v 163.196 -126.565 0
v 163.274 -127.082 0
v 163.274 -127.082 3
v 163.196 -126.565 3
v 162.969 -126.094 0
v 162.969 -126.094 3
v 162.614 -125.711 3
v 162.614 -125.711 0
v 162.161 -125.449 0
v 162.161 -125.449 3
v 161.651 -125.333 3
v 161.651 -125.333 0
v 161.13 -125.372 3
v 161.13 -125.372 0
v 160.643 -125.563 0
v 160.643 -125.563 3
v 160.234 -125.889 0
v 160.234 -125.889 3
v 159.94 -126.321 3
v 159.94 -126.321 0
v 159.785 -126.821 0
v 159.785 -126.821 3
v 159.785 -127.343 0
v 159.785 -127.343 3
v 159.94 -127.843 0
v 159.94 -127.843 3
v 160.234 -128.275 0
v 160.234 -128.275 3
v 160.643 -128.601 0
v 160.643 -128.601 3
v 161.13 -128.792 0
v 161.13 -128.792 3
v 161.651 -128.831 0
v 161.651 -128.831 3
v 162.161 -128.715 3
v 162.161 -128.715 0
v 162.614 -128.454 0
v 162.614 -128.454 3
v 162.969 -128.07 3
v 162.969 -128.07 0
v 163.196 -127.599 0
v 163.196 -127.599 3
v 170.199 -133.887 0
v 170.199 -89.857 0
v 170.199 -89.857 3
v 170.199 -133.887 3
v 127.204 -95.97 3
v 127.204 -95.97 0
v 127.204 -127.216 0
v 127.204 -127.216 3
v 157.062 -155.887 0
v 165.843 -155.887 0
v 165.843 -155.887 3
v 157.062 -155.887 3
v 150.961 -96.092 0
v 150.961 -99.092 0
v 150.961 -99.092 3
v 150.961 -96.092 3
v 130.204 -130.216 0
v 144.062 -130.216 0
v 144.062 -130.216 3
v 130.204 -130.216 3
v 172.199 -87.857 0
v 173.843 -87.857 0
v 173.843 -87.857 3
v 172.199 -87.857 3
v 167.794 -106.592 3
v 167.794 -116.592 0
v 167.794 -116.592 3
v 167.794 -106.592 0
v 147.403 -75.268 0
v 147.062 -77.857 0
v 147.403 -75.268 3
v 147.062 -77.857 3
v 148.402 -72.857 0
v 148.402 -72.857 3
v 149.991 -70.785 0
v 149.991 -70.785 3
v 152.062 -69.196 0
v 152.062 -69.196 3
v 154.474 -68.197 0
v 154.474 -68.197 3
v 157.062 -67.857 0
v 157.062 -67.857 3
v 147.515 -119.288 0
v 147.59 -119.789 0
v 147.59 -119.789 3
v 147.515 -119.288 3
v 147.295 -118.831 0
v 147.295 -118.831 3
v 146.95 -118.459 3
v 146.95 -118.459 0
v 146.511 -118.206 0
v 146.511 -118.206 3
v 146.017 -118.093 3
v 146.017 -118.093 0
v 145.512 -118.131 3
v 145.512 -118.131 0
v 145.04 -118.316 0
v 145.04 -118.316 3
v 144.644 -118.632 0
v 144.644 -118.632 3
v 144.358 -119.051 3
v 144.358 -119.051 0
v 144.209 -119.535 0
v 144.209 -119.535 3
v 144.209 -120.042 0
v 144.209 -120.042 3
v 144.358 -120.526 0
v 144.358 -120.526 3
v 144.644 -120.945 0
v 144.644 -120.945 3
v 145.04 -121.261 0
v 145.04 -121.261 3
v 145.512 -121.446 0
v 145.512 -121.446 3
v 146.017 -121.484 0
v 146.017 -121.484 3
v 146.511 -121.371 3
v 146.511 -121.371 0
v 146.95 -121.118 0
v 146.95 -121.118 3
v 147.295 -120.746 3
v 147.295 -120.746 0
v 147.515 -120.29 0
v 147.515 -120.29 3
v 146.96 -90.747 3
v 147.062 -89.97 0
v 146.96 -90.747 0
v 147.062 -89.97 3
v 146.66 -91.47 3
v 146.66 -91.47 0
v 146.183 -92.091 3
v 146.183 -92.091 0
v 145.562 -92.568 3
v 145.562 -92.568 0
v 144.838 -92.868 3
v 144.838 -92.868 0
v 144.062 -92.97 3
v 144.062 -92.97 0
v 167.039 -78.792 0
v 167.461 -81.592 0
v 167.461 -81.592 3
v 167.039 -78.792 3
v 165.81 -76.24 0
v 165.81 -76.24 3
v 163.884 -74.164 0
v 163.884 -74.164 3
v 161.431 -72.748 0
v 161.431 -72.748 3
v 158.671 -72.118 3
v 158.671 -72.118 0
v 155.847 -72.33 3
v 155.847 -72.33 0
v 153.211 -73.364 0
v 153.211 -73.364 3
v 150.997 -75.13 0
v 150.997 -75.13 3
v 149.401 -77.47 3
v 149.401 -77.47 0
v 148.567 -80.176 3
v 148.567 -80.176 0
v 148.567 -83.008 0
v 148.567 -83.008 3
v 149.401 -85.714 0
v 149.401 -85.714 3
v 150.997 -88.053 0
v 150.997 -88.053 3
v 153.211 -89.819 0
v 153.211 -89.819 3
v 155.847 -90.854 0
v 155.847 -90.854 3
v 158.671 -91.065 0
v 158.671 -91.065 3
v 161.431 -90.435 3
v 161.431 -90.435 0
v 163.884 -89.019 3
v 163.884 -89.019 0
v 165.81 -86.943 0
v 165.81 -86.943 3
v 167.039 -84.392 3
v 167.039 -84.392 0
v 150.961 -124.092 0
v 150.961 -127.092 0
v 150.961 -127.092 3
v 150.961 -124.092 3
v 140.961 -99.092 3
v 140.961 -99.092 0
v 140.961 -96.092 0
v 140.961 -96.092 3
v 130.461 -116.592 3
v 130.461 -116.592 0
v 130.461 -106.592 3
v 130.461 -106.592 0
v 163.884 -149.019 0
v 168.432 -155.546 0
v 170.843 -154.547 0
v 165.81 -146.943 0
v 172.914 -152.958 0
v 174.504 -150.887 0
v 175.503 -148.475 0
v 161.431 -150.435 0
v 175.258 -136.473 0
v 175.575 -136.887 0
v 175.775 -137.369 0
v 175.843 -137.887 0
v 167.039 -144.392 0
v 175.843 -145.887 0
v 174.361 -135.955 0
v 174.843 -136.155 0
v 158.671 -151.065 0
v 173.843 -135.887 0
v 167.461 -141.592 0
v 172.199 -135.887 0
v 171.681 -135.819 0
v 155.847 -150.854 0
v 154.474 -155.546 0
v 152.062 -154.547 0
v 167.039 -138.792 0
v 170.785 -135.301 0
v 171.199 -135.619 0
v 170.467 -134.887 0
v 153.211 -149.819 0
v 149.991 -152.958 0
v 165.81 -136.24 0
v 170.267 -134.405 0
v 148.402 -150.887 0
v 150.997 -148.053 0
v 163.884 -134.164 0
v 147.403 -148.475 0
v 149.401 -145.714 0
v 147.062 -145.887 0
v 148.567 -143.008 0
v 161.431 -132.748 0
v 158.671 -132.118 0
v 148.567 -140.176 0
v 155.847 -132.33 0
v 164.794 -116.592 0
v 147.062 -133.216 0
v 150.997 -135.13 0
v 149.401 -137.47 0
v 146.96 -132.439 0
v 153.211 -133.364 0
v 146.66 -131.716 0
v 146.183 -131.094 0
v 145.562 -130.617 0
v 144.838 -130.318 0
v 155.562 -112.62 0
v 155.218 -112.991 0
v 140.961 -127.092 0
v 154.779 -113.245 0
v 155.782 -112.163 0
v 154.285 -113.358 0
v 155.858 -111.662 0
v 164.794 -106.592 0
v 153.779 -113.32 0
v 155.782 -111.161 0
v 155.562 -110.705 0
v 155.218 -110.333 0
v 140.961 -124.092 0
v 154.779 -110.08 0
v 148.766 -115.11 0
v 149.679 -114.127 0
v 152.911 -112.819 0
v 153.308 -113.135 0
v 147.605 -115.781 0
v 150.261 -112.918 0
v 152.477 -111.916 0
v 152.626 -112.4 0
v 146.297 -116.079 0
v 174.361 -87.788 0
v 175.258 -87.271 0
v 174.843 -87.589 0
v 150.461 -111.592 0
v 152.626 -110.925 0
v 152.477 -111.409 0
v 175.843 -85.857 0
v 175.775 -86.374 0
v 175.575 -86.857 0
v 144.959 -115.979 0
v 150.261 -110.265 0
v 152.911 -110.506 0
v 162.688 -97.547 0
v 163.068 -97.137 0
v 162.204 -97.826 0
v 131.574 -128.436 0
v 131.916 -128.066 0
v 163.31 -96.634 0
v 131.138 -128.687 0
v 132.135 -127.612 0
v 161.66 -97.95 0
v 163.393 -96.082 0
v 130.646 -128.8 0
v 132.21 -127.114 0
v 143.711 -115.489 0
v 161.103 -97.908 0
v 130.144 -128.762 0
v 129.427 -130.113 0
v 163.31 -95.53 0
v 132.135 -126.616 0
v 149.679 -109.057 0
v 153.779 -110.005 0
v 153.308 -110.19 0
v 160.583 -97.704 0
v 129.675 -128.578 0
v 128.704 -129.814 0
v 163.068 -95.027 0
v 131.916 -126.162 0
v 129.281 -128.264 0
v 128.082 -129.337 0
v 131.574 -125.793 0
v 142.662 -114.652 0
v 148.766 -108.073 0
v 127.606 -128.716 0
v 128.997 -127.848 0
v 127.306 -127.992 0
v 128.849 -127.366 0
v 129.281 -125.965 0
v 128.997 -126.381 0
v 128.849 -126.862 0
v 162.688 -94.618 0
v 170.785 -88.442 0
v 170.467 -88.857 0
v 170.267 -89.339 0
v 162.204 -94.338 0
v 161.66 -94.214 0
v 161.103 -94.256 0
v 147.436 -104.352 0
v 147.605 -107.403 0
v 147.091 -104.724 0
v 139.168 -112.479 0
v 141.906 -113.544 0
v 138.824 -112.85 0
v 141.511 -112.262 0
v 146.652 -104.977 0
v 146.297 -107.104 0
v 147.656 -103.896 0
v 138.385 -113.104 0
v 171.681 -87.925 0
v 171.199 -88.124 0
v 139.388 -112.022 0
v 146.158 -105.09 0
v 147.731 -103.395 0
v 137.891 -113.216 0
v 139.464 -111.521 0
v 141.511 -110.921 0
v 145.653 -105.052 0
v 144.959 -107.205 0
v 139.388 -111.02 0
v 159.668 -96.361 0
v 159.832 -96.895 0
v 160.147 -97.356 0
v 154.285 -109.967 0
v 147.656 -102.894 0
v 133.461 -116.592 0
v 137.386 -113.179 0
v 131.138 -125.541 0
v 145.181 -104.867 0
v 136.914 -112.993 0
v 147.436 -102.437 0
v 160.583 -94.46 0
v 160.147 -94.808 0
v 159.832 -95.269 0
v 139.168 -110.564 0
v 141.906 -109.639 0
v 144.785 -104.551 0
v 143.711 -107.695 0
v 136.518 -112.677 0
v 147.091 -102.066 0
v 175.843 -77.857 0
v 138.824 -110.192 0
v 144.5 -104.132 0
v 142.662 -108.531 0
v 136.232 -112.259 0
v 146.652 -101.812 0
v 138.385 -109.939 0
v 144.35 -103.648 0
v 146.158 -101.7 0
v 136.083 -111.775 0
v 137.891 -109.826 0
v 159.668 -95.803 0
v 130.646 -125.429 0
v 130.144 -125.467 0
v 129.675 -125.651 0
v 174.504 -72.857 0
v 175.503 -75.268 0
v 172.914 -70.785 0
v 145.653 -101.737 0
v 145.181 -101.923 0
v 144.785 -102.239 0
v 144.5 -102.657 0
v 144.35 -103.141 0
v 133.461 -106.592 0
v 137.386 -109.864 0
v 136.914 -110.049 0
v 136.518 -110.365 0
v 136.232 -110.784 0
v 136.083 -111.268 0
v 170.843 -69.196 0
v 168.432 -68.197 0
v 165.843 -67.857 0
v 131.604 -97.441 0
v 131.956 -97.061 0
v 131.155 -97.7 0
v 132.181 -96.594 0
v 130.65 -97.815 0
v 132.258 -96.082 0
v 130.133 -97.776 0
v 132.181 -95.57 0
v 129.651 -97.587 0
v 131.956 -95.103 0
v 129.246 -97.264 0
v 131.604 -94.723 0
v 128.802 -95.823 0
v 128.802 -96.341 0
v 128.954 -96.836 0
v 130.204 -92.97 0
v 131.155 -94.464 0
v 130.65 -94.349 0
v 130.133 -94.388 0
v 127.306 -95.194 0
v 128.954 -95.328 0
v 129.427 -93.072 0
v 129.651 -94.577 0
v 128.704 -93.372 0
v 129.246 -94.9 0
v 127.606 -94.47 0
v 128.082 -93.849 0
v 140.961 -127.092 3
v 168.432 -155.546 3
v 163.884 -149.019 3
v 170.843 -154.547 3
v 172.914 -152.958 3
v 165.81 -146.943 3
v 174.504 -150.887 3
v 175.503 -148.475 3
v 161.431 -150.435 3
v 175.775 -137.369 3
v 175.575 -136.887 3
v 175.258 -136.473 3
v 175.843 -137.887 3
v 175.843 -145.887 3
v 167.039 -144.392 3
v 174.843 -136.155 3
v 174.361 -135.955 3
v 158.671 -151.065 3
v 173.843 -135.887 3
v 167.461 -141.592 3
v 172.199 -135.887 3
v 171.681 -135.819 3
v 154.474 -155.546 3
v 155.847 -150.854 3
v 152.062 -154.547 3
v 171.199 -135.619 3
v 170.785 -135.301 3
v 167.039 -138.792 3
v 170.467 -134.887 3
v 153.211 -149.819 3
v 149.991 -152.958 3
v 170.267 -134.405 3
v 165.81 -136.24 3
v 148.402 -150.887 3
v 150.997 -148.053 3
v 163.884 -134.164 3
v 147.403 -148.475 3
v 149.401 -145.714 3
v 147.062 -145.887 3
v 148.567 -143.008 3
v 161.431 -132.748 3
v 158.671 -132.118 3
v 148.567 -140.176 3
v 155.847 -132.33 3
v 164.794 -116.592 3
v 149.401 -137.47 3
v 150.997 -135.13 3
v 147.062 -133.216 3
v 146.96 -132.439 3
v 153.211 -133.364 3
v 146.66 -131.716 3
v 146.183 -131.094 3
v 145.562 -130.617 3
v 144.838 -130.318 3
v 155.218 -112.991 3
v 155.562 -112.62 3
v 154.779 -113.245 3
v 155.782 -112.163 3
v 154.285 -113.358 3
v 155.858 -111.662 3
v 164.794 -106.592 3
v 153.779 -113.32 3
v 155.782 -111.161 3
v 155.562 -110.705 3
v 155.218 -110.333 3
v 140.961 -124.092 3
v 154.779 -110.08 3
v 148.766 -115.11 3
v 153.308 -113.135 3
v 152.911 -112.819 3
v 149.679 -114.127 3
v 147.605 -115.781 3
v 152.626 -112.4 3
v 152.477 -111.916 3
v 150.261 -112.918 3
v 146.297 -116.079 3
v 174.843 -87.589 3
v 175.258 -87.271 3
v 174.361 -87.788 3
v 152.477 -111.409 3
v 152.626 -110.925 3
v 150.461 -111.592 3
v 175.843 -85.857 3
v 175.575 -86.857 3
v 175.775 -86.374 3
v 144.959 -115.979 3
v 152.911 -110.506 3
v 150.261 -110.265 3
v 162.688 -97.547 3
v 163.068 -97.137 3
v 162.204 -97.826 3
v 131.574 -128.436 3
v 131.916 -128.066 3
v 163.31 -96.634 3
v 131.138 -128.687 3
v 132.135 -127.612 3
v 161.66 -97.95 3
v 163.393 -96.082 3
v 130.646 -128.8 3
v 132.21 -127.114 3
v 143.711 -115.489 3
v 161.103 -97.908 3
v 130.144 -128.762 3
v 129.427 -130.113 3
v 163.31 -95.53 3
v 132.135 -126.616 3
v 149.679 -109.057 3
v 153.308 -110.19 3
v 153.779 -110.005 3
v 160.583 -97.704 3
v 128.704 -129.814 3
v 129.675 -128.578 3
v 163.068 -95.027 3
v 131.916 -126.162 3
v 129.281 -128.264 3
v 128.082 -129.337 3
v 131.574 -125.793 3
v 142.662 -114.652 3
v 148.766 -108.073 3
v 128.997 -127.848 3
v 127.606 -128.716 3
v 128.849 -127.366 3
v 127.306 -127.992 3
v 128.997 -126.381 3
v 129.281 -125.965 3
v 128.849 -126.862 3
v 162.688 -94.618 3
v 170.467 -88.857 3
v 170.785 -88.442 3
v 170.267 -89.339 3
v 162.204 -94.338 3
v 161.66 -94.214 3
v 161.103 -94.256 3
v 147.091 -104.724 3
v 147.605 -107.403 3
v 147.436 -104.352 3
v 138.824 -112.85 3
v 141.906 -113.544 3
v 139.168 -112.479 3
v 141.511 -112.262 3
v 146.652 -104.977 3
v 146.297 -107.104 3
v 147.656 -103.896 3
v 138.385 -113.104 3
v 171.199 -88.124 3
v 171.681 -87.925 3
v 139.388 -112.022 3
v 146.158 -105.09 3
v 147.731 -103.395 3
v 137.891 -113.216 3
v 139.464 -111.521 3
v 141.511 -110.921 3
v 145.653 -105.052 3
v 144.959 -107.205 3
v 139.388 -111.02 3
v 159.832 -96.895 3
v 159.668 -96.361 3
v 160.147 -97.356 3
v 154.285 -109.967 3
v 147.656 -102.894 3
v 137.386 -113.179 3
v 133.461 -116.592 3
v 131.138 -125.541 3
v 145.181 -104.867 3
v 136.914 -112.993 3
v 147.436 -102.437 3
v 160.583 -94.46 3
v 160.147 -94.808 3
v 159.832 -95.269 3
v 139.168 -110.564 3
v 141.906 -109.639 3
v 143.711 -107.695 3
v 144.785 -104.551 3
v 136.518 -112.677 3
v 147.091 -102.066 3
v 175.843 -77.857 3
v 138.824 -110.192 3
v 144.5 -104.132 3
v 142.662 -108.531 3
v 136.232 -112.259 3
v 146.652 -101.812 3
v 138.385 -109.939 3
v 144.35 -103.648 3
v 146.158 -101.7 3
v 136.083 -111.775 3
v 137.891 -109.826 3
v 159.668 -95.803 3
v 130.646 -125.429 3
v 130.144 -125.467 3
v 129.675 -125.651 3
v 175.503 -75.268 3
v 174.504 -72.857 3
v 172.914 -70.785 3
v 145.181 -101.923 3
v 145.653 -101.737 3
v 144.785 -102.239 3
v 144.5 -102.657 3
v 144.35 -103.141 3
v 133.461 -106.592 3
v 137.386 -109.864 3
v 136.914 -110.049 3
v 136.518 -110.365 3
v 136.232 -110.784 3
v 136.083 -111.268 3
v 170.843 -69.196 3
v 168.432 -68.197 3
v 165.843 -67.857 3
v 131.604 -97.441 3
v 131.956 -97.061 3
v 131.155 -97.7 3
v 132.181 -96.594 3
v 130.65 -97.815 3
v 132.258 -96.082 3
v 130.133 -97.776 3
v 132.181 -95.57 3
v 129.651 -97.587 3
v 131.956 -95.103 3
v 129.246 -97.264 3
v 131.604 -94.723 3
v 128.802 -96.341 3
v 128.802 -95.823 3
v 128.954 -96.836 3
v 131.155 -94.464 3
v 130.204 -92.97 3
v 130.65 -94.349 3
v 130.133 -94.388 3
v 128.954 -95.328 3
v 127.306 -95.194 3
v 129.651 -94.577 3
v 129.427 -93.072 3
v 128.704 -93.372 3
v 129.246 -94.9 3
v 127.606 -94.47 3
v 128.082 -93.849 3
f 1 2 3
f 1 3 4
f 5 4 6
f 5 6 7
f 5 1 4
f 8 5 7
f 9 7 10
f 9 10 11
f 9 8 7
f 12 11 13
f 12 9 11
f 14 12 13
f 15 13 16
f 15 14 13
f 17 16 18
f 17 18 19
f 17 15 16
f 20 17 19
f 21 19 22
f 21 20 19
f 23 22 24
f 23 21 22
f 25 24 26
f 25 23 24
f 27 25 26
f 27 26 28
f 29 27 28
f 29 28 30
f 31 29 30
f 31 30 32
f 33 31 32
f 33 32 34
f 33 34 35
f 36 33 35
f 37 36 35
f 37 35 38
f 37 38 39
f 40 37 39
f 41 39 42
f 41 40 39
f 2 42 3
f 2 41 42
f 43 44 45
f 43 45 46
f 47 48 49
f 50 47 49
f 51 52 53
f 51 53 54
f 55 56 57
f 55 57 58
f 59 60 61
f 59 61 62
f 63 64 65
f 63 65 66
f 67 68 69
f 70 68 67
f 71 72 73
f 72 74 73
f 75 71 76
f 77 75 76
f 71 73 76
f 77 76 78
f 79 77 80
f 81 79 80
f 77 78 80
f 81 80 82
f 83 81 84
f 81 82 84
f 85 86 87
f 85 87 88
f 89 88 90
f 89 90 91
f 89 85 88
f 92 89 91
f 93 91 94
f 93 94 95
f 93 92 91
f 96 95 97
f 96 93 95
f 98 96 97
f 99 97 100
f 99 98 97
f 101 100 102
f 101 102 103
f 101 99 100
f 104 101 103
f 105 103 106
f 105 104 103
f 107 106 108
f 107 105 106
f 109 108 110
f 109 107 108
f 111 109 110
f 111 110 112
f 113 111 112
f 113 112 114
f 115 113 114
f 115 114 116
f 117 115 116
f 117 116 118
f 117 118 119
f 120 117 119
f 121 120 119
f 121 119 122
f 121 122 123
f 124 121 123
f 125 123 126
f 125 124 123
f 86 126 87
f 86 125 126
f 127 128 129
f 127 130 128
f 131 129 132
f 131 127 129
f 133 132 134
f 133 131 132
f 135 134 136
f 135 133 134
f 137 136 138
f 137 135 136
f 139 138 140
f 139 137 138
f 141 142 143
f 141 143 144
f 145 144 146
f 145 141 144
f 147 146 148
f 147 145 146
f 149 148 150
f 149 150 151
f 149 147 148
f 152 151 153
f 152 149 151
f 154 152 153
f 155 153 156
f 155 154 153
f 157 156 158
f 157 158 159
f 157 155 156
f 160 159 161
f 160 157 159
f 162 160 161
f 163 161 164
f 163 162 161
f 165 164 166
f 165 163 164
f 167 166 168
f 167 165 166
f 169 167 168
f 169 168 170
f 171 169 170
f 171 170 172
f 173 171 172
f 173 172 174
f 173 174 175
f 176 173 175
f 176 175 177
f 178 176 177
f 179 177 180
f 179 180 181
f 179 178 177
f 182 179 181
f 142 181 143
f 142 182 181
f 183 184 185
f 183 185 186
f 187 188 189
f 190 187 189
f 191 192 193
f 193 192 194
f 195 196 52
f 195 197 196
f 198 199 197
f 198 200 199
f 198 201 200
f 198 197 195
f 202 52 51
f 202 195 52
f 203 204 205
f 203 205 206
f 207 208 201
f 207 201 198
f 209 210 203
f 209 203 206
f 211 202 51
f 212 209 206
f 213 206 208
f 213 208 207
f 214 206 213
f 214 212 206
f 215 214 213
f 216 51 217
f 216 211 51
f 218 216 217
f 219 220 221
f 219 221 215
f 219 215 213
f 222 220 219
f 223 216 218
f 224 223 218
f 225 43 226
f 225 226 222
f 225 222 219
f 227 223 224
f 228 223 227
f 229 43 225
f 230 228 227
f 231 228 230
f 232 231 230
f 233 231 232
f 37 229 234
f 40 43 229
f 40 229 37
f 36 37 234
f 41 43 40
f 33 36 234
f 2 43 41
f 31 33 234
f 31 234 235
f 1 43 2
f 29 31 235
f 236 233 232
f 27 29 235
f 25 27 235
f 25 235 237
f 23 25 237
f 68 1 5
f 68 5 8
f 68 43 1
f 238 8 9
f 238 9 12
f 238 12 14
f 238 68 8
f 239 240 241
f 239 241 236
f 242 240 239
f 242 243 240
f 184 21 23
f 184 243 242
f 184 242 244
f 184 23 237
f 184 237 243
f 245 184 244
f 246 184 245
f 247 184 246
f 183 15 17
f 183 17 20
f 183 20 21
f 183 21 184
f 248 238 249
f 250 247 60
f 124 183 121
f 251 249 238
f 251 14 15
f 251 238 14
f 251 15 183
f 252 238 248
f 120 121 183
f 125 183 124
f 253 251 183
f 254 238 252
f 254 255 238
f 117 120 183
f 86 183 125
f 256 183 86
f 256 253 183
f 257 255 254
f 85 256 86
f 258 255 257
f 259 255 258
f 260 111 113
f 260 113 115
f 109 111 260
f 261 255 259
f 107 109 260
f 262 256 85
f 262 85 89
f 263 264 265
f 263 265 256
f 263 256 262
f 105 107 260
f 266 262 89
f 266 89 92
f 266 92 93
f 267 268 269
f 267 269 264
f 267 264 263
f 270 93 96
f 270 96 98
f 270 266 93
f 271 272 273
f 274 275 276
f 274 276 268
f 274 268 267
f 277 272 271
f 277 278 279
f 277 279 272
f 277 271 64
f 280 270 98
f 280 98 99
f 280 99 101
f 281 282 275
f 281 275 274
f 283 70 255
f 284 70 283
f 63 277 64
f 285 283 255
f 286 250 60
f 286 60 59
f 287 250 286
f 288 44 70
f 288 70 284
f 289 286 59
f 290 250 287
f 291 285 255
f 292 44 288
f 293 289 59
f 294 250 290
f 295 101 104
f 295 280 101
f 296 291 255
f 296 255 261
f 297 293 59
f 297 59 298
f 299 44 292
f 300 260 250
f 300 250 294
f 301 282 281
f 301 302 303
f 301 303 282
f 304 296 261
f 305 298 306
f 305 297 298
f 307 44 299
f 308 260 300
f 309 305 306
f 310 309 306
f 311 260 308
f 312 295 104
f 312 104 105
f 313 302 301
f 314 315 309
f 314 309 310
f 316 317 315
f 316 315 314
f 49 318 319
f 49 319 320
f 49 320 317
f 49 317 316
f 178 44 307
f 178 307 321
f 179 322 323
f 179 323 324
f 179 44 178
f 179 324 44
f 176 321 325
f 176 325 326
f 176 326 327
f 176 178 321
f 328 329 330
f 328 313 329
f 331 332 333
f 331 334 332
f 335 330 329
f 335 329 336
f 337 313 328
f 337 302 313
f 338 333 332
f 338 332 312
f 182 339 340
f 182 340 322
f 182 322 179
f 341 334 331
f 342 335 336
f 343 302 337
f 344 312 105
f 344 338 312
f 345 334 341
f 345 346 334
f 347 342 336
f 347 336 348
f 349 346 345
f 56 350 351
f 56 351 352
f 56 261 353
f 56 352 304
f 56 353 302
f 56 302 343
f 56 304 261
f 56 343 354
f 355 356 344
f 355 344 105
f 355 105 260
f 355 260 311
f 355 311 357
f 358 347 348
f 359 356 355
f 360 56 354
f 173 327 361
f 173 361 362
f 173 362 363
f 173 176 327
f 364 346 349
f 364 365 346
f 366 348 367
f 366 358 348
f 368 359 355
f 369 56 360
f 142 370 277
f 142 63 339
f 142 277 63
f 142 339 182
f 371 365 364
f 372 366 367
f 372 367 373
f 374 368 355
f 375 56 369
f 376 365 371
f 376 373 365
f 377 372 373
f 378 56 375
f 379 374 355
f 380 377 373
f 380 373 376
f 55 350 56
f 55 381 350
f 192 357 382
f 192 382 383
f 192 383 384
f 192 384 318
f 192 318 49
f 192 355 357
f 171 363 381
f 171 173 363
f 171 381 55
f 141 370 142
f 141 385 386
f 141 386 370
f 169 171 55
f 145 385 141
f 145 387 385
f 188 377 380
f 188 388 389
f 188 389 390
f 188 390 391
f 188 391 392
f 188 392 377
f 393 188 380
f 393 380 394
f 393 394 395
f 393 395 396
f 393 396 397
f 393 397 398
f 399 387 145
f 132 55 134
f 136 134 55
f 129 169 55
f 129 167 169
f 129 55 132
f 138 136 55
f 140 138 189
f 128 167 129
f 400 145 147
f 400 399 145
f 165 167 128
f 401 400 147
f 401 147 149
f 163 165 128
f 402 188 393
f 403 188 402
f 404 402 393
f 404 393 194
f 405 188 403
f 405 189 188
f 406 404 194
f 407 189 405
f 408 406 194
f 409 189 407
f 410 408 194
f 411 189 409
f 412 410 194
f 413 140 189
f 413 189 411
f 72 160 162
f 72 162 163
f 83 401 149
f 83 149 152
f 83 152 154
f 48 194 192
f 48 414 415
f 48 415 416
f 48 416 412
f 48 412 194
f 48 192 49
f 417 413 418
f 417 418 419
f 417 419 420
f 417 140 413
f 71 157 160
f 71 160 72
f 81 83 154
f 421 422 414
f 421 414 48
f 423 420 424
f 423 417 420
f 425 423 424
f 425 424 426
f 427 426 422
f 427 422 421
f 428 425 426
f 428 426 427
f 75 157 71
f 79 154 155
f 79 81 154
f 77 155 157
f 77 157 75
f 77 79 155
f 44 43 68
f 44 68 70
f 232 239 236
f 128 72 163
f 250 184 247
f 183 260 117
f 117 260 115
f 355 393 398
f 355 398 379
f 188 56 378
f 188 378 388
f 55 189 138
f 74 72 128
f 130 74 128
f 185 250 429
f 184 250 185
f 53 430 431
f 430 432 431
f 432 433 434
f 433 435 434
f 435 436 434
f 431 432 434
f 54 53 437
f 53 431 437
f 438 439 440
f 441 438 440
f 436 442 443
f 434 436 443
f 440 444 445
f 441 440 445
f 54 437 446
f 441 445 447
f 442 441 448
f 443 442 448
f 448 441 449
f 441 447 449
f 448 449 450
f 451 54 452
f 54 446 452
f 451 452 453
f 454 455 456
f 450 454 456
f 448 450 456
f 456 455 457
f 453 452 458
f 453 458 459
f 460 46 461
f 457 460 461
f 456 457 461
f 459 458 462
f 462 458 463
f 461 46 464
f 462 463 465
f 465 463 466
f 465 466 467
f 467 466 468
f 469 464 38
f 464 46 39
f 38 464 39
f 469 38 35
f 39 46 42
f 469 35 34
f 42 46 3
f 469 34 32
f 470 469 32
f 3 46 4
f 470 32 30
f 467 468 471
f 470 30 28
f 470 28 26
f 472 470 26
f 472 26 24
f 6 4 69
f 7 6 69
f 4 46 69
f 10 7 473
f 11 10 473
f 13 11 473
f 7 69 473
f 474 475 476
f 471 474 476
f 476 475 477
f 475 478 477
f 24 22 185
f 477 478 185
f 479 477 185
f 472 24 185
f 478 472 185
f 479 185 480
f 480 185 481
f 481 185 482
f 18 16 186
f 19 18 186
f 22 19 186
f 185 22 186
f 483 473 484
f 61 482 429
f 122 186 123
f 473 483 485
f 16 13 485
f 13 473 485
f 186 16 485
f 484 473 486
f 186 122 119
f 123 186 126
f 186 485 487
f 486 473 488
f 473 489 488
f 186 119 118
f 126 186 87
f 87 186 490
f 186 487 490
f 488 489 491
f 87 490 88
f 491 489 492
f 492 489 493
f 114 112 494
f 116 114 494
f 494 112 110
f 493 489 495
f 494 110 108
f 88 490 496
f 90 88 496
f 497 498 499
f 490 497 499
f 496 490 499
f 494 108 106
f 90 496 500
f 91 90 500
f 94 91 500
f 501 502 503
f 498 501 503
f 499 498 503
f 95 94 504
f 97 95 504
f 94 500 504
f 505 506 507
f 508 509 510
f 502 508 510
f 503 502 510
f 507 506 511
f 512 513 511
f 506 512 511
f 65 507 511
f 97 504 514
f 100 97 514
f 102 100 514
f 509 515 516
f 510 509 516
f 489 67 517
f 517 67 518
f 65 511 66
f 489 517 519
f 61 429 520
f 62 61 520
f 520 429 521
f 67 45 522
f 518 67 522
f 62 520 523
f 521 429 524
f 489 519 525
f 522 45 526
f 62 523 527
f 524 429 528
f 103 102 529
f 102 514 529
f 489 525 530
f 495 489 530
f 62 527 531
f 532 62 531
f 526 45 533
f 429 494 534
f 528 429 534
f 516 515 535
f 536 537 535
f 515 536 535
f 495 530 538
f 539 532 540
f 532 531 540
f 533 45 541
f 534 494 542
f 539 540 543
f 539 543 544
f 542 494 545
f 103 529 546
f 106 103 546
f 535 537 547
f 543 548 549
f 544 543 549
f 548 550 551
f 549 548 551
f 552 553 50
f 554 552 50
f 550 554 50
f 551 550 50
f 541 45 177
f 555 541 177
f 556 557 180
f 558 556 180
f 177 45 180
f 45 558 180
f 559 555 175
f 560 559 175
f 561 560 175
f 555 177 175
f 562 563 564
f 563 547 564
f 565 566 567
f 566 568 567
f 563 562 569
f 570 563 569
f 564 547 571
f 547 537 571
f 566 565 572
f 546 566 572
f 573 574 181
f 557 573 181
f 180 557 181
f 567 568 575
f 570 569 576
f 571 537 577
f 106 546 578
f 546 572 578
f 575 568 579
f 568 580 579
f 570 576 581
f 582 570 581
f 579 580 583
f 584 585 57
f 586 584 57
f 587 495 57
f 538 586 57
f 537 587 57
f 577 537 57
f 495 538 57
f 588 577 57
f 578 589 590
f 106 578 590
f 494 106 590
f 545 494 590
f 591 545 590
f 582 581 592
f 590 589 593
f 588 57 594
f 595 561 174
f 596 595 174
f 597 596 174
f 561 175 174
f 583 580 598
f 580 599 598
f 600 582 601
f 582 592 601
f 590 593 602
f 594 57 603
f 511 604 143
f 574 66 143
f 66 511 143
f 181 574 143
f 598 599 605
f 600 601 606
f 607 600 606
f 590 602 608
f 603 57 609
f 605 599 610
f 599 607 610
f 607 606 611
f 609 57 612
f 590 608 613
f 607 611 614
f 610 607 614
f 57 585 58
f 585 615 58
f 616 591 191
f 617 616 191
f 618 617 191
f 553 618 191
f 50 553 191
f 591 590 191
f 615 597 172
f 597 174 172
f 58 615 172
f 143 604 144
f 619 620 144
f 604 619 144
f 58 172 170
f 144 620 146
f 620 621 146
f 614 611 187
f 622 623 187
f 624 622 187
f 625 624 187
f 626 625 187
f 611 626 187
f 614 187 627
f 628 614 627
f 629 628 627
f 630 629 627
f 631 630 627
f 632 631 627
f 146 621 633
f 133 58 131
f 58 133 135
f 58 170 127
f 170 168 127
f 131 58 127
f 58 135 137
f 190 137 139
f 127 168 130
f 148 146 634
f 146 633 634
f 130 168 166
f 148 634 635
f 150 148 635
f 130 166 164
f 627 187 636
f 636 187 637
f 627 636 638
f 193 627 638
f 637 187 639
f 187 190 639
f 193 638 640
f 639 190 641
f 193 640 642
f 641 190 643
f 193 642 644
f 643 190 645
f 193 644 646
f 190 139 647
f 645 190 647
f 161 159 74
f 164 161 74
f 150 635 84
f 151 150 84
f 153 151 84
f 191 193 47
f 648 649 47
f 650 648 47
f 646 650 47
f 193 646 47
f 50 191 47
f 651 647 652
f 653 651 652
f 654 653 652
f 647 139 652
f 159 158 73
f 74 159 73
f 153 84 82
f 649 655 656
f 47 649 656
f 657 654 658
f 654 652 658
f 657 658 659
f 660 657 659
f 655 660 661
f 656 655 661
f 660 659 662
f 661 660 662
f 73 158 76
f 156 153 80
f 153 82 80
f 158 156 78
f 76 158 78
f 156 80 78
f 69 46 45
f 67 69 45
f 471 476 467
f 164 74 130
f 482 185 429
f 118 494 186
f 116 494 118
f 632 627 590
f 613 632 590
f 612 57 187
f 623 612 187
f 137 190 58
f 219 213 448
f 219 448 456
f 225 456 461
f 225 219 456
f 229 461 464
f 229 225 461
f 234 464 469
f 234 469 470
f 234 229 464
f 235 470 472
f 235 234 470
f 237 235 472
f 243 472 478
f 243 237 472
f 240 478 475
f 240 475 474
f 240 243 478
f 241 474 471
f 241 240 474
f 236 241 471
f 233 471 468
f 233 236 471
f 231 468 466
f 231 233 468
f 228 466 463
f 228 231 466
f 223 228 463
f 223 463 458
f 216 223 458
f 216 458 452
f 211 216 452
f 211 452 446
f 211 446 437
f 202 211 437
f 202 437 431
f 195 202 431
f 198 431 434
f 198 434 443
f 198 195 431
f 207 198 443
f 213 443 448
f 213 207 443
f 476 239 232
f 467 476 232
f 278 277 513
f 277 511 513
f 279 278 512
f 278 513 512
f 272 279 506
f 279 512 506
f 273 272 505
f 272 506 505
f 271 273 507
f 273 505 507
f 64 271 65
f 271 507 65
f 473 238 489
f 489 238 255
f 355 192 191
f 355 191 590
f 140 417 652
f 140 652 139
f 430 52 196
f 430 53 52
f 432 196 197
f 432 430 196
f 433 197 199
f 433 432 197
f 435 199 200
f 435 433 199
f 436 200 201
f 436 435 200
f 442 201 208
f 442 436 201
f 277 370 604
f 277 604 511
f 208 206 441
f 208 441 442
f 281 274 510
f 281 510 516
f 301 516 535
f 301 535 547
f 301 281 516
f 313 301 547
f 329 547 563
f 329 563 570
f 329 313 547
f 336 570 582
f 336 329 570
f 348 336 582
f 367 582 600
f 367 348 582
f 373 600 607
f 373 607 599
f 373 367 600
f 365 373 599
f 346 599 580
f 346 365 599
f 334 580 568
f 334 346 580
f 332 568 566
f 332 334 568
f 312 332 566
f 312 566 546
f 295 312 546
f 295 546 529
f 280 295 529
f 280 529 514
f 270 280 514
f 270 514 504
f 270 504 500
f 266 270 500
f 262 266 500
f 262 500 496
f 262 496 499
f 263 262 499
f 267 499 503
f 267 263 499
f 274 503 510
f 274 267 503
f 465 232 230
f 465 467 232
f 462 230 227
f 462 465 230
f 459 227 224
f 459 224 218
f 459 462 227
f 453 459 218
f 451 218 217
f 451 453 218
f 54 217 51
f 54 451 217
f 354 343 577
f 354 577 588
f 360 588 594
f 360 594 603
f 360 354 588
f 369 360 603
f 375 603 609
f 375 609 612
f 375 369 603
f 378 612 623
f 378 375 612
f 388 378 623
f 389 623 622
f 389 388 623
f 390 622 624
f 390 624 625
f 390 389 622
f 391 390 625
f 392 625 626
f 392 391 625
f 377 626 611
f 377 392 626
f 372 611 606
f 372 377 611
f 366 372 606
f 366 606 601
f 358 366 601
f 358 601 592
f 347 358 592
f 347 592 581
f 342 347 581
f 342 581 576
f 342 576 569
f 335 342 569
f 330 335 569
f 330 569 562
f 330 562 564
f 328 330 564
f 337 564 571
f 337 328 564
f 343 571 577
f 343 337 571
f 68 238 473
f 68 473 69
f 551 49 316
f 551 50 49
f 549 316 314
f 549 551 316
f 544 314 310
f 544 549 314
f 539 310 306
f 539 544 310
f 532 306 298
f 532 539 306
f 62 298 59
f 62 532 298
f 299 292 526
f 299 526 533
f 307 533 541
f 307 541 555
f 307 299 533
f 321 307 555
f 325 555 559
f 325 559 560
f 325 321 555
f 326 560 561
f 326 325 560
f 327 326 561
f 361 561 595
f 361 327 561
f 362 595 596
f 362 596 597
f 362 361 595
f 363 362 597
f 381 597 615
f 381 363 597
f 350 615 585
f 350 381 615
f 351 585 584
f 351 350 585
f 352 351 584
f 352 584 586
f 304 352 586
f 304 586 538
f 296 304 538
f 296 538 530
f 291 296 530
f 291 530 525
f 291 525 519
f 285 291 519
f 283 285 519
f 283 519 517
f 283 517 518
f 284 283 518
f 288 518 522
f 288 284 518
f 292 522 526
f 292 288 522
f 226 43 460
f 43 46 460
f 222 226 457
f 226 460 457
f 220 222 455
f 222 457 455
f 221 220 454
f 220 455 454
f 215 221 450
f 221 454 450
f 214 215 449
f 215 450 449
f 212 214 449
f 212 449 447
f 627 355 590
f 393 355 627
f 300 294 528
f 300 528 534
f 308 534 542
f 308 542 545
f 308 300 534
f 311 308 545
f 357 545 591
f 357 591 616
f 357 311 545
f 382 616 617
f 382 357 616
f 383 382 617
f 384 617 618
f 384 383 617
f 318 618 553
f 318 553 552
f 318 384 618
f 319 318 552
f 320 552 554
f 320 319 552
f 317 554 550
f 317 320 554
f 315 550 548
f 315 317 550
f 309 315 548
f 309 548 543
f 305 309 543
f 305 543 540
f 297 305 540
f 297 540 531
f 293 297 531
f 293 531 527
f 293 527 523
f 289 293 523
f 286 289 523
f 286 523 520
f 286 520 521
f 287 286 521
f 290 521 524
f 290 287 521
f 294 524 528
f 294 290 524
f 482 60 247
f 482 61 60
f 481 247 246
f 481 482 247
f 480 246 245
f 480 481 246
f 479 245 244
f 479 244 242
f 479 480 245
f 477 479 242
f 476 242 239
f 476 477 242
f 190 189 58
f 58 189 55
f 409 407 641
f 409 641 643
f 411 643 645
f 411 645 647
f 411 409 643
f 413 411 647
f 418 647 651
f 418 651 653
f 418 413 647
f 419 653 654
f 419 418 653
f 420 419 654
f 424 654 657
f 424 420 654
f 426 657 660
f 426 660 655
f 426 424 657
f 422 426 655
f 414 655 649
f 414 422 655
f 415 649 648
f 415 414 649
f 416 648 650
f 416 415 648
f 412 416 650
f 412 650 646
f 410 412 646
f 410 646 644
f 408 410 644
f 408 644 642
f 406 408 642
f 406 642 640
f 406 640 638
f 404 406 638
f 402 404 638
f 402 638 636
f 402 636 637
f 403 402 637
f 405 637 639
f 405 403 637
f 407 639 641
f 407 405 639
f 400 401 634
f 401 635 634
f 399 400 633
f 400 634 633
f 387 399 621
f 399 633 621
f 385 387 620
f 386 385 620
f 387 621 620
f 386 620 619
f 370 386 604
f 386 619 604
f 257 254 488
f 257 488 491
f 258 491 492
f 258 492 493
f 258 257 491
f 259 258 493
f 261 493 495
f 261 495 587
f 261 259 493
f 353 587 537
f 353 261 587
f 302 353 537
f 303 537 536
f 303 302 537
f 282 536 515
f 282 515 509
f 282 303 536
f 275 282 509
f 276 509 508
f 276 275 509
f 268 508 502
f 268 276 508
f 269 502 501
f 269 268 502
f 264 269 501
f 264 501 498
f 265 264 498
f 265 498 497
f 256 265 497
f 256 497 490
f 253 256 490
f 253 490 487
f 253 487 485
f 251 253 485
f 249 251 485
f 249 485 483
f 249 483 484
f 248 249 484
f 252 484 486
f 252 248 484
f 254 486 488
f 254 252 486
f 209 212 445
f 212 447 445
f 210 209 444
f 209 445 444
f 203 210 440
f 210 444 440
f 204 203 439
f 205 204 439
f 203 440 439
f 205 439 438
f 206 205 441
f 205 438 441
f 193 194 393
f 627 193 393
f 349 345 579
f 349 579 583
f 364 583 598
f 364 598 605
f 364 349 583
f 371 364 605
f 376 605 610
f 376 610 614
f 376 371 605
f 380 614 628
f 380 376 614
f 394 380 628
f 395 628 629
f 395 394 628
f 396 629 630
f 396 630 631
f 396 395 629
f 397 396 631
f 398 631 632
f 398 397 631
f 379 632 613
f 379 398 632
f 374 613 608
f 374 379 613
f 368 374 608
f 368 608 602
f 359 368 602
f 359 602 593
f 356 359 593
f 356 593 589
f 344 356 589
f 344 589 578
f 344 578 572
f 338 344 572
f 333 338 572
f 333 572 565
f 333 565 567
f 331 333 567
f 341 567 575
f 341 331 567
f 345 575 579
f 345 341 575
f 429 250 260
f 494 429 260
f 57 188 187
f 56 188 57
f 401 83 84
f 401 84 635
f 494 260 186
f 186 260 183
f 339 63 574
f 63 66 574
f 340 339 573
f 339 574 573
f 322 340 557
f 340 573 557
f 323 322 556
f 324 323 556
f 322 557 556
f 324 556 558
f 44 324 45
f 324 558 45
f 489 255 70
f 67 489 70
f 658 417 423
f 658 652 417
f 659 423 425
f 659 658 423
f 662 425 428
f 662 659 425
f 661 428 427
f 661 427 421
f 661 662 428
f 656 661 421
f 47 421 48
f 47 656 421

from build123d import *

# Parameters (mm, degrees)
SKETCH1_R           = 1.737885662
SKETCH1_R_2         = 1.873200063
SKETCH1_R_3         = 1.690089146
SKETCH1_R_4         = 1.754205974
SKETCH1_R_5         = 1.7
SKETCH1_R_6         = 4.5
SKETCH1_R_7         = 9.5
SKETCH1_W           = 3
SKETCH1_H           = 10
SKETCH1_W_2         = 10
SKETCH1_H_2         = 3
BOSS_EXTRUDE1_DEPTH = 3
FILLET1_R           = 10
FILLET2_R           = 3
FILLET3_R           = 2


with BuildPart() as part:
    # Sketch1 → Boss-Extrude1 (new body)
    with BuildSketch(Plane.XY):
        Polygon((147.061964125, -92.970138098), (147.061964125, -71.856515964), (147.061964125, -67.856515964), (175.843347401, -67.856515964), (175.843347401, -87.856515964), (170.198907285, -87.856515964), (170.198907285, -135.887076434), (175.843347401, -135.887076434), (175.843347401, -155.887076434), (147.061964125, -155.887076434), (147.061964125, -151.887076434), (147.061964125, -130.215533927), (127.203791419, -130.215533927), (127.203791419, -111.591712302), (127.203791419, -92.970138098), align=None)
        with Locations((130.520049527, -96.082032258)):
            Circle(SKETCH1_R, mode=Mode.SUBTRACT)
        with Locations((161.520049527, -96.082032258)):
            Circle(SKETCH1_R_2, mode=Mode.SUBTRACT)
        with Locations((130.520049527, -127.114221831)):
            Circle(SKETCH1_R_3, mode=Mode.SUBTRACT)
        with Locations((161.520049527, -127.082032258)):
            Circle(SKETCH1_R_4, mode=Mode.SUBTRACT)
        with Locations((154.157584865, -111.662272701)):
            Circle(SKETCH1_R_5, mode=Mode.SUBTRACT)
        with Locations((145.89014032, -119.788596448)):
            Circle(SKETCH1_R_5, mode=Mode.SUBTRACT)
        with Locations((137.763816574, -111.521151903)):
            Circle(SKETCH1_R_5, mode=Mode.SUBTRACT)
        with Locations((146.031261118, -103.394828157)):
            Circle(SKETCH1_R_5, mode=Mode.SUBTRACT)
        with Locations((145.960700719, -111.591712302)):
            Circle(SKETCH1_R_6, mode=Mode.SUBTRACT)
        with Locations((157.960700719, -81.591712302)):
            Circle(SKETCH1_R_7, mode=Mode.SUBTRACT)
        with Locations((157.960700719, -141.591712302)):
            Circle(SKETCH1_R_7, mode=Mode.SUBTRACT)
        with Locations((131.960700719, -111.591712302)):
            Rectangle(SKETCH1_W, SKETCH1_H, mode=Mode.SUBTRACT)
        with Locations((145.960700719, -97.591712302)):
            Rectangle(SKETCH1_W_2, SKETCH1_H_2, mode=Mode.SUBTRACT)
        with Locations((145.960700719, -125.591712302)):
            Rectangle(SKETCH1_W_2, SKETCH1_H_2, mode=Mode.SUBTRACT)
        with Locations((166.293610901, -111.591712302)):
            Rectangle(SKETCH1_W, SKETCH1_H, mode=Mode.SUBTRACT)
    extrude(amount=BOSS_EXTRUDE1_DEPTH)

    # Fillet1
    fillet1_edges = [part.edges().sort_by_distance(p)[0] for p in [
        (147.061964125, -67.856515964, 1.5),
        (175.843347401, -67.856515964, 1.5),
        (175.843347401, -155.887076434, 1.5),
        (147.061964125, -155.887076434, 1.5),
    ]]
    fillet(fillet1_edges, radius=FILLET1_R)

    # Fillet2
    fillet2_edges = [part.edges().sort_by_distance(p)[0] for p in [
        (147.061964125, -130.215533927, 1.5),
        (127.203791419, -130.215533927, 1.5),
        (127.203791419, -92.970138098, 1.5),
        (147.061964125, -92.970138098, 1.5),
    ]]
    fillet(fillet2_edges, radius=FILLET2_R)

    # Fillet3
    fillet3_edges = [part.edges().sort_by_distance(p)[0] for p in [
        (175.843347401, -87.856515964, 1.5),
        (170.198907285, -87.856515964, 1.5),
        (170.198907285, -135.887076434, 1.5),
        (175.843347401, -135.887076434, 1.5),
    ]]
    fillet(fillet3_edges, radius=FILLET3_R)


solid = part.part
